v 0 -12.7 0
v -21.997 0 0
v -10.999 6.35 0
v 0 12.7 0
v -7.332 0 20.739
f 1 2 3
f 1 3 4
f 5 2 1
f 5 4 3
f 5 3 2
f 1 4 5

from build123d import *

# Parameters (mm, degrees)
F4_DEPTH  = 25.4
F5_W      = 46.6010663658
F5_H      = 39.7627335042
F6_DEPTH  = 25.4
F8_W      = 68.0729933083
F8_H      = 50.7683739997
F9_DEPTH  = 25.4
F11_W     = 45.6217722967
F11_H     = 58.1790879369
F12_DEPTH = 25.4


with BuildPart() as f4:
    # F0 (on Top) → F4 (new body)
    with BuildSketch(Plane.XY):
        Polygon((0, -12.7), (0, 0), (-7.3323484187, 0), align=None)
        Polygon((-7.3323484187, 0), (0, 0), (0, 12.7), (-10.9985226281, 6.35), align=None)
        Polygon((-21.9970452561, 0), (0, -12.7), (-7.3323484187, 0), align=None)
        Polygon((-21.9970452561, 0), (-7.3323484187, 0), (-10.9985226281, 6.35), align=None)
    extrude(amount=F4_DEPTH)

    # F5 (on 3pt) → F6 (cut)
    with BuildSketch(Plane(origin=(0, 0, 0), x_dir=(0, -1, 0), z_dir=(-0.9428090416, 0, -0.3333333333))):
        with Locations((-4.0135839954, 15.0211239234)):
            Rectangle(F5_W, F5_H)
    extrude(amount=-F6_DEPTH, mode=Mode.SUBTRACT)

    # F8 (on 3pt) → F9 (cut)
    with BuildSketch(Plane(origin=(-4.8882322791, -8.4666666667, 3.4565021926), x_dir=(0.8819171037, -0.4364357805, 0.1781741613), z_dir=(-0.4714045208, -0.8164965809, 0.3333333333))):
        with Locations((0.508910045, 15.6671002042)):
            Rectangle(F8_W, F8_H)
    extrude(amount=F9_DEPTH, mode=Mode.SUBTRACT)

    # F11 (on 3pt) → F12 (cut)
    with BuildSketch(Plane(origin=(-4.8882322791, 8.4666666667, 3.4565021926), x_dir=(-0.8819171037, -0.4364357805, -0.1781741613), z_dir=(-0.4714045208, 0.8164965809, 0.3333333333))):
        with Locations((11.0377906822, 16.6354514658)):
            Rectangle(F11_W, F11_H)
    extrude(amount=F12_DEPTH, mode=Mode.SUBTRACT)


solid = f4.part
